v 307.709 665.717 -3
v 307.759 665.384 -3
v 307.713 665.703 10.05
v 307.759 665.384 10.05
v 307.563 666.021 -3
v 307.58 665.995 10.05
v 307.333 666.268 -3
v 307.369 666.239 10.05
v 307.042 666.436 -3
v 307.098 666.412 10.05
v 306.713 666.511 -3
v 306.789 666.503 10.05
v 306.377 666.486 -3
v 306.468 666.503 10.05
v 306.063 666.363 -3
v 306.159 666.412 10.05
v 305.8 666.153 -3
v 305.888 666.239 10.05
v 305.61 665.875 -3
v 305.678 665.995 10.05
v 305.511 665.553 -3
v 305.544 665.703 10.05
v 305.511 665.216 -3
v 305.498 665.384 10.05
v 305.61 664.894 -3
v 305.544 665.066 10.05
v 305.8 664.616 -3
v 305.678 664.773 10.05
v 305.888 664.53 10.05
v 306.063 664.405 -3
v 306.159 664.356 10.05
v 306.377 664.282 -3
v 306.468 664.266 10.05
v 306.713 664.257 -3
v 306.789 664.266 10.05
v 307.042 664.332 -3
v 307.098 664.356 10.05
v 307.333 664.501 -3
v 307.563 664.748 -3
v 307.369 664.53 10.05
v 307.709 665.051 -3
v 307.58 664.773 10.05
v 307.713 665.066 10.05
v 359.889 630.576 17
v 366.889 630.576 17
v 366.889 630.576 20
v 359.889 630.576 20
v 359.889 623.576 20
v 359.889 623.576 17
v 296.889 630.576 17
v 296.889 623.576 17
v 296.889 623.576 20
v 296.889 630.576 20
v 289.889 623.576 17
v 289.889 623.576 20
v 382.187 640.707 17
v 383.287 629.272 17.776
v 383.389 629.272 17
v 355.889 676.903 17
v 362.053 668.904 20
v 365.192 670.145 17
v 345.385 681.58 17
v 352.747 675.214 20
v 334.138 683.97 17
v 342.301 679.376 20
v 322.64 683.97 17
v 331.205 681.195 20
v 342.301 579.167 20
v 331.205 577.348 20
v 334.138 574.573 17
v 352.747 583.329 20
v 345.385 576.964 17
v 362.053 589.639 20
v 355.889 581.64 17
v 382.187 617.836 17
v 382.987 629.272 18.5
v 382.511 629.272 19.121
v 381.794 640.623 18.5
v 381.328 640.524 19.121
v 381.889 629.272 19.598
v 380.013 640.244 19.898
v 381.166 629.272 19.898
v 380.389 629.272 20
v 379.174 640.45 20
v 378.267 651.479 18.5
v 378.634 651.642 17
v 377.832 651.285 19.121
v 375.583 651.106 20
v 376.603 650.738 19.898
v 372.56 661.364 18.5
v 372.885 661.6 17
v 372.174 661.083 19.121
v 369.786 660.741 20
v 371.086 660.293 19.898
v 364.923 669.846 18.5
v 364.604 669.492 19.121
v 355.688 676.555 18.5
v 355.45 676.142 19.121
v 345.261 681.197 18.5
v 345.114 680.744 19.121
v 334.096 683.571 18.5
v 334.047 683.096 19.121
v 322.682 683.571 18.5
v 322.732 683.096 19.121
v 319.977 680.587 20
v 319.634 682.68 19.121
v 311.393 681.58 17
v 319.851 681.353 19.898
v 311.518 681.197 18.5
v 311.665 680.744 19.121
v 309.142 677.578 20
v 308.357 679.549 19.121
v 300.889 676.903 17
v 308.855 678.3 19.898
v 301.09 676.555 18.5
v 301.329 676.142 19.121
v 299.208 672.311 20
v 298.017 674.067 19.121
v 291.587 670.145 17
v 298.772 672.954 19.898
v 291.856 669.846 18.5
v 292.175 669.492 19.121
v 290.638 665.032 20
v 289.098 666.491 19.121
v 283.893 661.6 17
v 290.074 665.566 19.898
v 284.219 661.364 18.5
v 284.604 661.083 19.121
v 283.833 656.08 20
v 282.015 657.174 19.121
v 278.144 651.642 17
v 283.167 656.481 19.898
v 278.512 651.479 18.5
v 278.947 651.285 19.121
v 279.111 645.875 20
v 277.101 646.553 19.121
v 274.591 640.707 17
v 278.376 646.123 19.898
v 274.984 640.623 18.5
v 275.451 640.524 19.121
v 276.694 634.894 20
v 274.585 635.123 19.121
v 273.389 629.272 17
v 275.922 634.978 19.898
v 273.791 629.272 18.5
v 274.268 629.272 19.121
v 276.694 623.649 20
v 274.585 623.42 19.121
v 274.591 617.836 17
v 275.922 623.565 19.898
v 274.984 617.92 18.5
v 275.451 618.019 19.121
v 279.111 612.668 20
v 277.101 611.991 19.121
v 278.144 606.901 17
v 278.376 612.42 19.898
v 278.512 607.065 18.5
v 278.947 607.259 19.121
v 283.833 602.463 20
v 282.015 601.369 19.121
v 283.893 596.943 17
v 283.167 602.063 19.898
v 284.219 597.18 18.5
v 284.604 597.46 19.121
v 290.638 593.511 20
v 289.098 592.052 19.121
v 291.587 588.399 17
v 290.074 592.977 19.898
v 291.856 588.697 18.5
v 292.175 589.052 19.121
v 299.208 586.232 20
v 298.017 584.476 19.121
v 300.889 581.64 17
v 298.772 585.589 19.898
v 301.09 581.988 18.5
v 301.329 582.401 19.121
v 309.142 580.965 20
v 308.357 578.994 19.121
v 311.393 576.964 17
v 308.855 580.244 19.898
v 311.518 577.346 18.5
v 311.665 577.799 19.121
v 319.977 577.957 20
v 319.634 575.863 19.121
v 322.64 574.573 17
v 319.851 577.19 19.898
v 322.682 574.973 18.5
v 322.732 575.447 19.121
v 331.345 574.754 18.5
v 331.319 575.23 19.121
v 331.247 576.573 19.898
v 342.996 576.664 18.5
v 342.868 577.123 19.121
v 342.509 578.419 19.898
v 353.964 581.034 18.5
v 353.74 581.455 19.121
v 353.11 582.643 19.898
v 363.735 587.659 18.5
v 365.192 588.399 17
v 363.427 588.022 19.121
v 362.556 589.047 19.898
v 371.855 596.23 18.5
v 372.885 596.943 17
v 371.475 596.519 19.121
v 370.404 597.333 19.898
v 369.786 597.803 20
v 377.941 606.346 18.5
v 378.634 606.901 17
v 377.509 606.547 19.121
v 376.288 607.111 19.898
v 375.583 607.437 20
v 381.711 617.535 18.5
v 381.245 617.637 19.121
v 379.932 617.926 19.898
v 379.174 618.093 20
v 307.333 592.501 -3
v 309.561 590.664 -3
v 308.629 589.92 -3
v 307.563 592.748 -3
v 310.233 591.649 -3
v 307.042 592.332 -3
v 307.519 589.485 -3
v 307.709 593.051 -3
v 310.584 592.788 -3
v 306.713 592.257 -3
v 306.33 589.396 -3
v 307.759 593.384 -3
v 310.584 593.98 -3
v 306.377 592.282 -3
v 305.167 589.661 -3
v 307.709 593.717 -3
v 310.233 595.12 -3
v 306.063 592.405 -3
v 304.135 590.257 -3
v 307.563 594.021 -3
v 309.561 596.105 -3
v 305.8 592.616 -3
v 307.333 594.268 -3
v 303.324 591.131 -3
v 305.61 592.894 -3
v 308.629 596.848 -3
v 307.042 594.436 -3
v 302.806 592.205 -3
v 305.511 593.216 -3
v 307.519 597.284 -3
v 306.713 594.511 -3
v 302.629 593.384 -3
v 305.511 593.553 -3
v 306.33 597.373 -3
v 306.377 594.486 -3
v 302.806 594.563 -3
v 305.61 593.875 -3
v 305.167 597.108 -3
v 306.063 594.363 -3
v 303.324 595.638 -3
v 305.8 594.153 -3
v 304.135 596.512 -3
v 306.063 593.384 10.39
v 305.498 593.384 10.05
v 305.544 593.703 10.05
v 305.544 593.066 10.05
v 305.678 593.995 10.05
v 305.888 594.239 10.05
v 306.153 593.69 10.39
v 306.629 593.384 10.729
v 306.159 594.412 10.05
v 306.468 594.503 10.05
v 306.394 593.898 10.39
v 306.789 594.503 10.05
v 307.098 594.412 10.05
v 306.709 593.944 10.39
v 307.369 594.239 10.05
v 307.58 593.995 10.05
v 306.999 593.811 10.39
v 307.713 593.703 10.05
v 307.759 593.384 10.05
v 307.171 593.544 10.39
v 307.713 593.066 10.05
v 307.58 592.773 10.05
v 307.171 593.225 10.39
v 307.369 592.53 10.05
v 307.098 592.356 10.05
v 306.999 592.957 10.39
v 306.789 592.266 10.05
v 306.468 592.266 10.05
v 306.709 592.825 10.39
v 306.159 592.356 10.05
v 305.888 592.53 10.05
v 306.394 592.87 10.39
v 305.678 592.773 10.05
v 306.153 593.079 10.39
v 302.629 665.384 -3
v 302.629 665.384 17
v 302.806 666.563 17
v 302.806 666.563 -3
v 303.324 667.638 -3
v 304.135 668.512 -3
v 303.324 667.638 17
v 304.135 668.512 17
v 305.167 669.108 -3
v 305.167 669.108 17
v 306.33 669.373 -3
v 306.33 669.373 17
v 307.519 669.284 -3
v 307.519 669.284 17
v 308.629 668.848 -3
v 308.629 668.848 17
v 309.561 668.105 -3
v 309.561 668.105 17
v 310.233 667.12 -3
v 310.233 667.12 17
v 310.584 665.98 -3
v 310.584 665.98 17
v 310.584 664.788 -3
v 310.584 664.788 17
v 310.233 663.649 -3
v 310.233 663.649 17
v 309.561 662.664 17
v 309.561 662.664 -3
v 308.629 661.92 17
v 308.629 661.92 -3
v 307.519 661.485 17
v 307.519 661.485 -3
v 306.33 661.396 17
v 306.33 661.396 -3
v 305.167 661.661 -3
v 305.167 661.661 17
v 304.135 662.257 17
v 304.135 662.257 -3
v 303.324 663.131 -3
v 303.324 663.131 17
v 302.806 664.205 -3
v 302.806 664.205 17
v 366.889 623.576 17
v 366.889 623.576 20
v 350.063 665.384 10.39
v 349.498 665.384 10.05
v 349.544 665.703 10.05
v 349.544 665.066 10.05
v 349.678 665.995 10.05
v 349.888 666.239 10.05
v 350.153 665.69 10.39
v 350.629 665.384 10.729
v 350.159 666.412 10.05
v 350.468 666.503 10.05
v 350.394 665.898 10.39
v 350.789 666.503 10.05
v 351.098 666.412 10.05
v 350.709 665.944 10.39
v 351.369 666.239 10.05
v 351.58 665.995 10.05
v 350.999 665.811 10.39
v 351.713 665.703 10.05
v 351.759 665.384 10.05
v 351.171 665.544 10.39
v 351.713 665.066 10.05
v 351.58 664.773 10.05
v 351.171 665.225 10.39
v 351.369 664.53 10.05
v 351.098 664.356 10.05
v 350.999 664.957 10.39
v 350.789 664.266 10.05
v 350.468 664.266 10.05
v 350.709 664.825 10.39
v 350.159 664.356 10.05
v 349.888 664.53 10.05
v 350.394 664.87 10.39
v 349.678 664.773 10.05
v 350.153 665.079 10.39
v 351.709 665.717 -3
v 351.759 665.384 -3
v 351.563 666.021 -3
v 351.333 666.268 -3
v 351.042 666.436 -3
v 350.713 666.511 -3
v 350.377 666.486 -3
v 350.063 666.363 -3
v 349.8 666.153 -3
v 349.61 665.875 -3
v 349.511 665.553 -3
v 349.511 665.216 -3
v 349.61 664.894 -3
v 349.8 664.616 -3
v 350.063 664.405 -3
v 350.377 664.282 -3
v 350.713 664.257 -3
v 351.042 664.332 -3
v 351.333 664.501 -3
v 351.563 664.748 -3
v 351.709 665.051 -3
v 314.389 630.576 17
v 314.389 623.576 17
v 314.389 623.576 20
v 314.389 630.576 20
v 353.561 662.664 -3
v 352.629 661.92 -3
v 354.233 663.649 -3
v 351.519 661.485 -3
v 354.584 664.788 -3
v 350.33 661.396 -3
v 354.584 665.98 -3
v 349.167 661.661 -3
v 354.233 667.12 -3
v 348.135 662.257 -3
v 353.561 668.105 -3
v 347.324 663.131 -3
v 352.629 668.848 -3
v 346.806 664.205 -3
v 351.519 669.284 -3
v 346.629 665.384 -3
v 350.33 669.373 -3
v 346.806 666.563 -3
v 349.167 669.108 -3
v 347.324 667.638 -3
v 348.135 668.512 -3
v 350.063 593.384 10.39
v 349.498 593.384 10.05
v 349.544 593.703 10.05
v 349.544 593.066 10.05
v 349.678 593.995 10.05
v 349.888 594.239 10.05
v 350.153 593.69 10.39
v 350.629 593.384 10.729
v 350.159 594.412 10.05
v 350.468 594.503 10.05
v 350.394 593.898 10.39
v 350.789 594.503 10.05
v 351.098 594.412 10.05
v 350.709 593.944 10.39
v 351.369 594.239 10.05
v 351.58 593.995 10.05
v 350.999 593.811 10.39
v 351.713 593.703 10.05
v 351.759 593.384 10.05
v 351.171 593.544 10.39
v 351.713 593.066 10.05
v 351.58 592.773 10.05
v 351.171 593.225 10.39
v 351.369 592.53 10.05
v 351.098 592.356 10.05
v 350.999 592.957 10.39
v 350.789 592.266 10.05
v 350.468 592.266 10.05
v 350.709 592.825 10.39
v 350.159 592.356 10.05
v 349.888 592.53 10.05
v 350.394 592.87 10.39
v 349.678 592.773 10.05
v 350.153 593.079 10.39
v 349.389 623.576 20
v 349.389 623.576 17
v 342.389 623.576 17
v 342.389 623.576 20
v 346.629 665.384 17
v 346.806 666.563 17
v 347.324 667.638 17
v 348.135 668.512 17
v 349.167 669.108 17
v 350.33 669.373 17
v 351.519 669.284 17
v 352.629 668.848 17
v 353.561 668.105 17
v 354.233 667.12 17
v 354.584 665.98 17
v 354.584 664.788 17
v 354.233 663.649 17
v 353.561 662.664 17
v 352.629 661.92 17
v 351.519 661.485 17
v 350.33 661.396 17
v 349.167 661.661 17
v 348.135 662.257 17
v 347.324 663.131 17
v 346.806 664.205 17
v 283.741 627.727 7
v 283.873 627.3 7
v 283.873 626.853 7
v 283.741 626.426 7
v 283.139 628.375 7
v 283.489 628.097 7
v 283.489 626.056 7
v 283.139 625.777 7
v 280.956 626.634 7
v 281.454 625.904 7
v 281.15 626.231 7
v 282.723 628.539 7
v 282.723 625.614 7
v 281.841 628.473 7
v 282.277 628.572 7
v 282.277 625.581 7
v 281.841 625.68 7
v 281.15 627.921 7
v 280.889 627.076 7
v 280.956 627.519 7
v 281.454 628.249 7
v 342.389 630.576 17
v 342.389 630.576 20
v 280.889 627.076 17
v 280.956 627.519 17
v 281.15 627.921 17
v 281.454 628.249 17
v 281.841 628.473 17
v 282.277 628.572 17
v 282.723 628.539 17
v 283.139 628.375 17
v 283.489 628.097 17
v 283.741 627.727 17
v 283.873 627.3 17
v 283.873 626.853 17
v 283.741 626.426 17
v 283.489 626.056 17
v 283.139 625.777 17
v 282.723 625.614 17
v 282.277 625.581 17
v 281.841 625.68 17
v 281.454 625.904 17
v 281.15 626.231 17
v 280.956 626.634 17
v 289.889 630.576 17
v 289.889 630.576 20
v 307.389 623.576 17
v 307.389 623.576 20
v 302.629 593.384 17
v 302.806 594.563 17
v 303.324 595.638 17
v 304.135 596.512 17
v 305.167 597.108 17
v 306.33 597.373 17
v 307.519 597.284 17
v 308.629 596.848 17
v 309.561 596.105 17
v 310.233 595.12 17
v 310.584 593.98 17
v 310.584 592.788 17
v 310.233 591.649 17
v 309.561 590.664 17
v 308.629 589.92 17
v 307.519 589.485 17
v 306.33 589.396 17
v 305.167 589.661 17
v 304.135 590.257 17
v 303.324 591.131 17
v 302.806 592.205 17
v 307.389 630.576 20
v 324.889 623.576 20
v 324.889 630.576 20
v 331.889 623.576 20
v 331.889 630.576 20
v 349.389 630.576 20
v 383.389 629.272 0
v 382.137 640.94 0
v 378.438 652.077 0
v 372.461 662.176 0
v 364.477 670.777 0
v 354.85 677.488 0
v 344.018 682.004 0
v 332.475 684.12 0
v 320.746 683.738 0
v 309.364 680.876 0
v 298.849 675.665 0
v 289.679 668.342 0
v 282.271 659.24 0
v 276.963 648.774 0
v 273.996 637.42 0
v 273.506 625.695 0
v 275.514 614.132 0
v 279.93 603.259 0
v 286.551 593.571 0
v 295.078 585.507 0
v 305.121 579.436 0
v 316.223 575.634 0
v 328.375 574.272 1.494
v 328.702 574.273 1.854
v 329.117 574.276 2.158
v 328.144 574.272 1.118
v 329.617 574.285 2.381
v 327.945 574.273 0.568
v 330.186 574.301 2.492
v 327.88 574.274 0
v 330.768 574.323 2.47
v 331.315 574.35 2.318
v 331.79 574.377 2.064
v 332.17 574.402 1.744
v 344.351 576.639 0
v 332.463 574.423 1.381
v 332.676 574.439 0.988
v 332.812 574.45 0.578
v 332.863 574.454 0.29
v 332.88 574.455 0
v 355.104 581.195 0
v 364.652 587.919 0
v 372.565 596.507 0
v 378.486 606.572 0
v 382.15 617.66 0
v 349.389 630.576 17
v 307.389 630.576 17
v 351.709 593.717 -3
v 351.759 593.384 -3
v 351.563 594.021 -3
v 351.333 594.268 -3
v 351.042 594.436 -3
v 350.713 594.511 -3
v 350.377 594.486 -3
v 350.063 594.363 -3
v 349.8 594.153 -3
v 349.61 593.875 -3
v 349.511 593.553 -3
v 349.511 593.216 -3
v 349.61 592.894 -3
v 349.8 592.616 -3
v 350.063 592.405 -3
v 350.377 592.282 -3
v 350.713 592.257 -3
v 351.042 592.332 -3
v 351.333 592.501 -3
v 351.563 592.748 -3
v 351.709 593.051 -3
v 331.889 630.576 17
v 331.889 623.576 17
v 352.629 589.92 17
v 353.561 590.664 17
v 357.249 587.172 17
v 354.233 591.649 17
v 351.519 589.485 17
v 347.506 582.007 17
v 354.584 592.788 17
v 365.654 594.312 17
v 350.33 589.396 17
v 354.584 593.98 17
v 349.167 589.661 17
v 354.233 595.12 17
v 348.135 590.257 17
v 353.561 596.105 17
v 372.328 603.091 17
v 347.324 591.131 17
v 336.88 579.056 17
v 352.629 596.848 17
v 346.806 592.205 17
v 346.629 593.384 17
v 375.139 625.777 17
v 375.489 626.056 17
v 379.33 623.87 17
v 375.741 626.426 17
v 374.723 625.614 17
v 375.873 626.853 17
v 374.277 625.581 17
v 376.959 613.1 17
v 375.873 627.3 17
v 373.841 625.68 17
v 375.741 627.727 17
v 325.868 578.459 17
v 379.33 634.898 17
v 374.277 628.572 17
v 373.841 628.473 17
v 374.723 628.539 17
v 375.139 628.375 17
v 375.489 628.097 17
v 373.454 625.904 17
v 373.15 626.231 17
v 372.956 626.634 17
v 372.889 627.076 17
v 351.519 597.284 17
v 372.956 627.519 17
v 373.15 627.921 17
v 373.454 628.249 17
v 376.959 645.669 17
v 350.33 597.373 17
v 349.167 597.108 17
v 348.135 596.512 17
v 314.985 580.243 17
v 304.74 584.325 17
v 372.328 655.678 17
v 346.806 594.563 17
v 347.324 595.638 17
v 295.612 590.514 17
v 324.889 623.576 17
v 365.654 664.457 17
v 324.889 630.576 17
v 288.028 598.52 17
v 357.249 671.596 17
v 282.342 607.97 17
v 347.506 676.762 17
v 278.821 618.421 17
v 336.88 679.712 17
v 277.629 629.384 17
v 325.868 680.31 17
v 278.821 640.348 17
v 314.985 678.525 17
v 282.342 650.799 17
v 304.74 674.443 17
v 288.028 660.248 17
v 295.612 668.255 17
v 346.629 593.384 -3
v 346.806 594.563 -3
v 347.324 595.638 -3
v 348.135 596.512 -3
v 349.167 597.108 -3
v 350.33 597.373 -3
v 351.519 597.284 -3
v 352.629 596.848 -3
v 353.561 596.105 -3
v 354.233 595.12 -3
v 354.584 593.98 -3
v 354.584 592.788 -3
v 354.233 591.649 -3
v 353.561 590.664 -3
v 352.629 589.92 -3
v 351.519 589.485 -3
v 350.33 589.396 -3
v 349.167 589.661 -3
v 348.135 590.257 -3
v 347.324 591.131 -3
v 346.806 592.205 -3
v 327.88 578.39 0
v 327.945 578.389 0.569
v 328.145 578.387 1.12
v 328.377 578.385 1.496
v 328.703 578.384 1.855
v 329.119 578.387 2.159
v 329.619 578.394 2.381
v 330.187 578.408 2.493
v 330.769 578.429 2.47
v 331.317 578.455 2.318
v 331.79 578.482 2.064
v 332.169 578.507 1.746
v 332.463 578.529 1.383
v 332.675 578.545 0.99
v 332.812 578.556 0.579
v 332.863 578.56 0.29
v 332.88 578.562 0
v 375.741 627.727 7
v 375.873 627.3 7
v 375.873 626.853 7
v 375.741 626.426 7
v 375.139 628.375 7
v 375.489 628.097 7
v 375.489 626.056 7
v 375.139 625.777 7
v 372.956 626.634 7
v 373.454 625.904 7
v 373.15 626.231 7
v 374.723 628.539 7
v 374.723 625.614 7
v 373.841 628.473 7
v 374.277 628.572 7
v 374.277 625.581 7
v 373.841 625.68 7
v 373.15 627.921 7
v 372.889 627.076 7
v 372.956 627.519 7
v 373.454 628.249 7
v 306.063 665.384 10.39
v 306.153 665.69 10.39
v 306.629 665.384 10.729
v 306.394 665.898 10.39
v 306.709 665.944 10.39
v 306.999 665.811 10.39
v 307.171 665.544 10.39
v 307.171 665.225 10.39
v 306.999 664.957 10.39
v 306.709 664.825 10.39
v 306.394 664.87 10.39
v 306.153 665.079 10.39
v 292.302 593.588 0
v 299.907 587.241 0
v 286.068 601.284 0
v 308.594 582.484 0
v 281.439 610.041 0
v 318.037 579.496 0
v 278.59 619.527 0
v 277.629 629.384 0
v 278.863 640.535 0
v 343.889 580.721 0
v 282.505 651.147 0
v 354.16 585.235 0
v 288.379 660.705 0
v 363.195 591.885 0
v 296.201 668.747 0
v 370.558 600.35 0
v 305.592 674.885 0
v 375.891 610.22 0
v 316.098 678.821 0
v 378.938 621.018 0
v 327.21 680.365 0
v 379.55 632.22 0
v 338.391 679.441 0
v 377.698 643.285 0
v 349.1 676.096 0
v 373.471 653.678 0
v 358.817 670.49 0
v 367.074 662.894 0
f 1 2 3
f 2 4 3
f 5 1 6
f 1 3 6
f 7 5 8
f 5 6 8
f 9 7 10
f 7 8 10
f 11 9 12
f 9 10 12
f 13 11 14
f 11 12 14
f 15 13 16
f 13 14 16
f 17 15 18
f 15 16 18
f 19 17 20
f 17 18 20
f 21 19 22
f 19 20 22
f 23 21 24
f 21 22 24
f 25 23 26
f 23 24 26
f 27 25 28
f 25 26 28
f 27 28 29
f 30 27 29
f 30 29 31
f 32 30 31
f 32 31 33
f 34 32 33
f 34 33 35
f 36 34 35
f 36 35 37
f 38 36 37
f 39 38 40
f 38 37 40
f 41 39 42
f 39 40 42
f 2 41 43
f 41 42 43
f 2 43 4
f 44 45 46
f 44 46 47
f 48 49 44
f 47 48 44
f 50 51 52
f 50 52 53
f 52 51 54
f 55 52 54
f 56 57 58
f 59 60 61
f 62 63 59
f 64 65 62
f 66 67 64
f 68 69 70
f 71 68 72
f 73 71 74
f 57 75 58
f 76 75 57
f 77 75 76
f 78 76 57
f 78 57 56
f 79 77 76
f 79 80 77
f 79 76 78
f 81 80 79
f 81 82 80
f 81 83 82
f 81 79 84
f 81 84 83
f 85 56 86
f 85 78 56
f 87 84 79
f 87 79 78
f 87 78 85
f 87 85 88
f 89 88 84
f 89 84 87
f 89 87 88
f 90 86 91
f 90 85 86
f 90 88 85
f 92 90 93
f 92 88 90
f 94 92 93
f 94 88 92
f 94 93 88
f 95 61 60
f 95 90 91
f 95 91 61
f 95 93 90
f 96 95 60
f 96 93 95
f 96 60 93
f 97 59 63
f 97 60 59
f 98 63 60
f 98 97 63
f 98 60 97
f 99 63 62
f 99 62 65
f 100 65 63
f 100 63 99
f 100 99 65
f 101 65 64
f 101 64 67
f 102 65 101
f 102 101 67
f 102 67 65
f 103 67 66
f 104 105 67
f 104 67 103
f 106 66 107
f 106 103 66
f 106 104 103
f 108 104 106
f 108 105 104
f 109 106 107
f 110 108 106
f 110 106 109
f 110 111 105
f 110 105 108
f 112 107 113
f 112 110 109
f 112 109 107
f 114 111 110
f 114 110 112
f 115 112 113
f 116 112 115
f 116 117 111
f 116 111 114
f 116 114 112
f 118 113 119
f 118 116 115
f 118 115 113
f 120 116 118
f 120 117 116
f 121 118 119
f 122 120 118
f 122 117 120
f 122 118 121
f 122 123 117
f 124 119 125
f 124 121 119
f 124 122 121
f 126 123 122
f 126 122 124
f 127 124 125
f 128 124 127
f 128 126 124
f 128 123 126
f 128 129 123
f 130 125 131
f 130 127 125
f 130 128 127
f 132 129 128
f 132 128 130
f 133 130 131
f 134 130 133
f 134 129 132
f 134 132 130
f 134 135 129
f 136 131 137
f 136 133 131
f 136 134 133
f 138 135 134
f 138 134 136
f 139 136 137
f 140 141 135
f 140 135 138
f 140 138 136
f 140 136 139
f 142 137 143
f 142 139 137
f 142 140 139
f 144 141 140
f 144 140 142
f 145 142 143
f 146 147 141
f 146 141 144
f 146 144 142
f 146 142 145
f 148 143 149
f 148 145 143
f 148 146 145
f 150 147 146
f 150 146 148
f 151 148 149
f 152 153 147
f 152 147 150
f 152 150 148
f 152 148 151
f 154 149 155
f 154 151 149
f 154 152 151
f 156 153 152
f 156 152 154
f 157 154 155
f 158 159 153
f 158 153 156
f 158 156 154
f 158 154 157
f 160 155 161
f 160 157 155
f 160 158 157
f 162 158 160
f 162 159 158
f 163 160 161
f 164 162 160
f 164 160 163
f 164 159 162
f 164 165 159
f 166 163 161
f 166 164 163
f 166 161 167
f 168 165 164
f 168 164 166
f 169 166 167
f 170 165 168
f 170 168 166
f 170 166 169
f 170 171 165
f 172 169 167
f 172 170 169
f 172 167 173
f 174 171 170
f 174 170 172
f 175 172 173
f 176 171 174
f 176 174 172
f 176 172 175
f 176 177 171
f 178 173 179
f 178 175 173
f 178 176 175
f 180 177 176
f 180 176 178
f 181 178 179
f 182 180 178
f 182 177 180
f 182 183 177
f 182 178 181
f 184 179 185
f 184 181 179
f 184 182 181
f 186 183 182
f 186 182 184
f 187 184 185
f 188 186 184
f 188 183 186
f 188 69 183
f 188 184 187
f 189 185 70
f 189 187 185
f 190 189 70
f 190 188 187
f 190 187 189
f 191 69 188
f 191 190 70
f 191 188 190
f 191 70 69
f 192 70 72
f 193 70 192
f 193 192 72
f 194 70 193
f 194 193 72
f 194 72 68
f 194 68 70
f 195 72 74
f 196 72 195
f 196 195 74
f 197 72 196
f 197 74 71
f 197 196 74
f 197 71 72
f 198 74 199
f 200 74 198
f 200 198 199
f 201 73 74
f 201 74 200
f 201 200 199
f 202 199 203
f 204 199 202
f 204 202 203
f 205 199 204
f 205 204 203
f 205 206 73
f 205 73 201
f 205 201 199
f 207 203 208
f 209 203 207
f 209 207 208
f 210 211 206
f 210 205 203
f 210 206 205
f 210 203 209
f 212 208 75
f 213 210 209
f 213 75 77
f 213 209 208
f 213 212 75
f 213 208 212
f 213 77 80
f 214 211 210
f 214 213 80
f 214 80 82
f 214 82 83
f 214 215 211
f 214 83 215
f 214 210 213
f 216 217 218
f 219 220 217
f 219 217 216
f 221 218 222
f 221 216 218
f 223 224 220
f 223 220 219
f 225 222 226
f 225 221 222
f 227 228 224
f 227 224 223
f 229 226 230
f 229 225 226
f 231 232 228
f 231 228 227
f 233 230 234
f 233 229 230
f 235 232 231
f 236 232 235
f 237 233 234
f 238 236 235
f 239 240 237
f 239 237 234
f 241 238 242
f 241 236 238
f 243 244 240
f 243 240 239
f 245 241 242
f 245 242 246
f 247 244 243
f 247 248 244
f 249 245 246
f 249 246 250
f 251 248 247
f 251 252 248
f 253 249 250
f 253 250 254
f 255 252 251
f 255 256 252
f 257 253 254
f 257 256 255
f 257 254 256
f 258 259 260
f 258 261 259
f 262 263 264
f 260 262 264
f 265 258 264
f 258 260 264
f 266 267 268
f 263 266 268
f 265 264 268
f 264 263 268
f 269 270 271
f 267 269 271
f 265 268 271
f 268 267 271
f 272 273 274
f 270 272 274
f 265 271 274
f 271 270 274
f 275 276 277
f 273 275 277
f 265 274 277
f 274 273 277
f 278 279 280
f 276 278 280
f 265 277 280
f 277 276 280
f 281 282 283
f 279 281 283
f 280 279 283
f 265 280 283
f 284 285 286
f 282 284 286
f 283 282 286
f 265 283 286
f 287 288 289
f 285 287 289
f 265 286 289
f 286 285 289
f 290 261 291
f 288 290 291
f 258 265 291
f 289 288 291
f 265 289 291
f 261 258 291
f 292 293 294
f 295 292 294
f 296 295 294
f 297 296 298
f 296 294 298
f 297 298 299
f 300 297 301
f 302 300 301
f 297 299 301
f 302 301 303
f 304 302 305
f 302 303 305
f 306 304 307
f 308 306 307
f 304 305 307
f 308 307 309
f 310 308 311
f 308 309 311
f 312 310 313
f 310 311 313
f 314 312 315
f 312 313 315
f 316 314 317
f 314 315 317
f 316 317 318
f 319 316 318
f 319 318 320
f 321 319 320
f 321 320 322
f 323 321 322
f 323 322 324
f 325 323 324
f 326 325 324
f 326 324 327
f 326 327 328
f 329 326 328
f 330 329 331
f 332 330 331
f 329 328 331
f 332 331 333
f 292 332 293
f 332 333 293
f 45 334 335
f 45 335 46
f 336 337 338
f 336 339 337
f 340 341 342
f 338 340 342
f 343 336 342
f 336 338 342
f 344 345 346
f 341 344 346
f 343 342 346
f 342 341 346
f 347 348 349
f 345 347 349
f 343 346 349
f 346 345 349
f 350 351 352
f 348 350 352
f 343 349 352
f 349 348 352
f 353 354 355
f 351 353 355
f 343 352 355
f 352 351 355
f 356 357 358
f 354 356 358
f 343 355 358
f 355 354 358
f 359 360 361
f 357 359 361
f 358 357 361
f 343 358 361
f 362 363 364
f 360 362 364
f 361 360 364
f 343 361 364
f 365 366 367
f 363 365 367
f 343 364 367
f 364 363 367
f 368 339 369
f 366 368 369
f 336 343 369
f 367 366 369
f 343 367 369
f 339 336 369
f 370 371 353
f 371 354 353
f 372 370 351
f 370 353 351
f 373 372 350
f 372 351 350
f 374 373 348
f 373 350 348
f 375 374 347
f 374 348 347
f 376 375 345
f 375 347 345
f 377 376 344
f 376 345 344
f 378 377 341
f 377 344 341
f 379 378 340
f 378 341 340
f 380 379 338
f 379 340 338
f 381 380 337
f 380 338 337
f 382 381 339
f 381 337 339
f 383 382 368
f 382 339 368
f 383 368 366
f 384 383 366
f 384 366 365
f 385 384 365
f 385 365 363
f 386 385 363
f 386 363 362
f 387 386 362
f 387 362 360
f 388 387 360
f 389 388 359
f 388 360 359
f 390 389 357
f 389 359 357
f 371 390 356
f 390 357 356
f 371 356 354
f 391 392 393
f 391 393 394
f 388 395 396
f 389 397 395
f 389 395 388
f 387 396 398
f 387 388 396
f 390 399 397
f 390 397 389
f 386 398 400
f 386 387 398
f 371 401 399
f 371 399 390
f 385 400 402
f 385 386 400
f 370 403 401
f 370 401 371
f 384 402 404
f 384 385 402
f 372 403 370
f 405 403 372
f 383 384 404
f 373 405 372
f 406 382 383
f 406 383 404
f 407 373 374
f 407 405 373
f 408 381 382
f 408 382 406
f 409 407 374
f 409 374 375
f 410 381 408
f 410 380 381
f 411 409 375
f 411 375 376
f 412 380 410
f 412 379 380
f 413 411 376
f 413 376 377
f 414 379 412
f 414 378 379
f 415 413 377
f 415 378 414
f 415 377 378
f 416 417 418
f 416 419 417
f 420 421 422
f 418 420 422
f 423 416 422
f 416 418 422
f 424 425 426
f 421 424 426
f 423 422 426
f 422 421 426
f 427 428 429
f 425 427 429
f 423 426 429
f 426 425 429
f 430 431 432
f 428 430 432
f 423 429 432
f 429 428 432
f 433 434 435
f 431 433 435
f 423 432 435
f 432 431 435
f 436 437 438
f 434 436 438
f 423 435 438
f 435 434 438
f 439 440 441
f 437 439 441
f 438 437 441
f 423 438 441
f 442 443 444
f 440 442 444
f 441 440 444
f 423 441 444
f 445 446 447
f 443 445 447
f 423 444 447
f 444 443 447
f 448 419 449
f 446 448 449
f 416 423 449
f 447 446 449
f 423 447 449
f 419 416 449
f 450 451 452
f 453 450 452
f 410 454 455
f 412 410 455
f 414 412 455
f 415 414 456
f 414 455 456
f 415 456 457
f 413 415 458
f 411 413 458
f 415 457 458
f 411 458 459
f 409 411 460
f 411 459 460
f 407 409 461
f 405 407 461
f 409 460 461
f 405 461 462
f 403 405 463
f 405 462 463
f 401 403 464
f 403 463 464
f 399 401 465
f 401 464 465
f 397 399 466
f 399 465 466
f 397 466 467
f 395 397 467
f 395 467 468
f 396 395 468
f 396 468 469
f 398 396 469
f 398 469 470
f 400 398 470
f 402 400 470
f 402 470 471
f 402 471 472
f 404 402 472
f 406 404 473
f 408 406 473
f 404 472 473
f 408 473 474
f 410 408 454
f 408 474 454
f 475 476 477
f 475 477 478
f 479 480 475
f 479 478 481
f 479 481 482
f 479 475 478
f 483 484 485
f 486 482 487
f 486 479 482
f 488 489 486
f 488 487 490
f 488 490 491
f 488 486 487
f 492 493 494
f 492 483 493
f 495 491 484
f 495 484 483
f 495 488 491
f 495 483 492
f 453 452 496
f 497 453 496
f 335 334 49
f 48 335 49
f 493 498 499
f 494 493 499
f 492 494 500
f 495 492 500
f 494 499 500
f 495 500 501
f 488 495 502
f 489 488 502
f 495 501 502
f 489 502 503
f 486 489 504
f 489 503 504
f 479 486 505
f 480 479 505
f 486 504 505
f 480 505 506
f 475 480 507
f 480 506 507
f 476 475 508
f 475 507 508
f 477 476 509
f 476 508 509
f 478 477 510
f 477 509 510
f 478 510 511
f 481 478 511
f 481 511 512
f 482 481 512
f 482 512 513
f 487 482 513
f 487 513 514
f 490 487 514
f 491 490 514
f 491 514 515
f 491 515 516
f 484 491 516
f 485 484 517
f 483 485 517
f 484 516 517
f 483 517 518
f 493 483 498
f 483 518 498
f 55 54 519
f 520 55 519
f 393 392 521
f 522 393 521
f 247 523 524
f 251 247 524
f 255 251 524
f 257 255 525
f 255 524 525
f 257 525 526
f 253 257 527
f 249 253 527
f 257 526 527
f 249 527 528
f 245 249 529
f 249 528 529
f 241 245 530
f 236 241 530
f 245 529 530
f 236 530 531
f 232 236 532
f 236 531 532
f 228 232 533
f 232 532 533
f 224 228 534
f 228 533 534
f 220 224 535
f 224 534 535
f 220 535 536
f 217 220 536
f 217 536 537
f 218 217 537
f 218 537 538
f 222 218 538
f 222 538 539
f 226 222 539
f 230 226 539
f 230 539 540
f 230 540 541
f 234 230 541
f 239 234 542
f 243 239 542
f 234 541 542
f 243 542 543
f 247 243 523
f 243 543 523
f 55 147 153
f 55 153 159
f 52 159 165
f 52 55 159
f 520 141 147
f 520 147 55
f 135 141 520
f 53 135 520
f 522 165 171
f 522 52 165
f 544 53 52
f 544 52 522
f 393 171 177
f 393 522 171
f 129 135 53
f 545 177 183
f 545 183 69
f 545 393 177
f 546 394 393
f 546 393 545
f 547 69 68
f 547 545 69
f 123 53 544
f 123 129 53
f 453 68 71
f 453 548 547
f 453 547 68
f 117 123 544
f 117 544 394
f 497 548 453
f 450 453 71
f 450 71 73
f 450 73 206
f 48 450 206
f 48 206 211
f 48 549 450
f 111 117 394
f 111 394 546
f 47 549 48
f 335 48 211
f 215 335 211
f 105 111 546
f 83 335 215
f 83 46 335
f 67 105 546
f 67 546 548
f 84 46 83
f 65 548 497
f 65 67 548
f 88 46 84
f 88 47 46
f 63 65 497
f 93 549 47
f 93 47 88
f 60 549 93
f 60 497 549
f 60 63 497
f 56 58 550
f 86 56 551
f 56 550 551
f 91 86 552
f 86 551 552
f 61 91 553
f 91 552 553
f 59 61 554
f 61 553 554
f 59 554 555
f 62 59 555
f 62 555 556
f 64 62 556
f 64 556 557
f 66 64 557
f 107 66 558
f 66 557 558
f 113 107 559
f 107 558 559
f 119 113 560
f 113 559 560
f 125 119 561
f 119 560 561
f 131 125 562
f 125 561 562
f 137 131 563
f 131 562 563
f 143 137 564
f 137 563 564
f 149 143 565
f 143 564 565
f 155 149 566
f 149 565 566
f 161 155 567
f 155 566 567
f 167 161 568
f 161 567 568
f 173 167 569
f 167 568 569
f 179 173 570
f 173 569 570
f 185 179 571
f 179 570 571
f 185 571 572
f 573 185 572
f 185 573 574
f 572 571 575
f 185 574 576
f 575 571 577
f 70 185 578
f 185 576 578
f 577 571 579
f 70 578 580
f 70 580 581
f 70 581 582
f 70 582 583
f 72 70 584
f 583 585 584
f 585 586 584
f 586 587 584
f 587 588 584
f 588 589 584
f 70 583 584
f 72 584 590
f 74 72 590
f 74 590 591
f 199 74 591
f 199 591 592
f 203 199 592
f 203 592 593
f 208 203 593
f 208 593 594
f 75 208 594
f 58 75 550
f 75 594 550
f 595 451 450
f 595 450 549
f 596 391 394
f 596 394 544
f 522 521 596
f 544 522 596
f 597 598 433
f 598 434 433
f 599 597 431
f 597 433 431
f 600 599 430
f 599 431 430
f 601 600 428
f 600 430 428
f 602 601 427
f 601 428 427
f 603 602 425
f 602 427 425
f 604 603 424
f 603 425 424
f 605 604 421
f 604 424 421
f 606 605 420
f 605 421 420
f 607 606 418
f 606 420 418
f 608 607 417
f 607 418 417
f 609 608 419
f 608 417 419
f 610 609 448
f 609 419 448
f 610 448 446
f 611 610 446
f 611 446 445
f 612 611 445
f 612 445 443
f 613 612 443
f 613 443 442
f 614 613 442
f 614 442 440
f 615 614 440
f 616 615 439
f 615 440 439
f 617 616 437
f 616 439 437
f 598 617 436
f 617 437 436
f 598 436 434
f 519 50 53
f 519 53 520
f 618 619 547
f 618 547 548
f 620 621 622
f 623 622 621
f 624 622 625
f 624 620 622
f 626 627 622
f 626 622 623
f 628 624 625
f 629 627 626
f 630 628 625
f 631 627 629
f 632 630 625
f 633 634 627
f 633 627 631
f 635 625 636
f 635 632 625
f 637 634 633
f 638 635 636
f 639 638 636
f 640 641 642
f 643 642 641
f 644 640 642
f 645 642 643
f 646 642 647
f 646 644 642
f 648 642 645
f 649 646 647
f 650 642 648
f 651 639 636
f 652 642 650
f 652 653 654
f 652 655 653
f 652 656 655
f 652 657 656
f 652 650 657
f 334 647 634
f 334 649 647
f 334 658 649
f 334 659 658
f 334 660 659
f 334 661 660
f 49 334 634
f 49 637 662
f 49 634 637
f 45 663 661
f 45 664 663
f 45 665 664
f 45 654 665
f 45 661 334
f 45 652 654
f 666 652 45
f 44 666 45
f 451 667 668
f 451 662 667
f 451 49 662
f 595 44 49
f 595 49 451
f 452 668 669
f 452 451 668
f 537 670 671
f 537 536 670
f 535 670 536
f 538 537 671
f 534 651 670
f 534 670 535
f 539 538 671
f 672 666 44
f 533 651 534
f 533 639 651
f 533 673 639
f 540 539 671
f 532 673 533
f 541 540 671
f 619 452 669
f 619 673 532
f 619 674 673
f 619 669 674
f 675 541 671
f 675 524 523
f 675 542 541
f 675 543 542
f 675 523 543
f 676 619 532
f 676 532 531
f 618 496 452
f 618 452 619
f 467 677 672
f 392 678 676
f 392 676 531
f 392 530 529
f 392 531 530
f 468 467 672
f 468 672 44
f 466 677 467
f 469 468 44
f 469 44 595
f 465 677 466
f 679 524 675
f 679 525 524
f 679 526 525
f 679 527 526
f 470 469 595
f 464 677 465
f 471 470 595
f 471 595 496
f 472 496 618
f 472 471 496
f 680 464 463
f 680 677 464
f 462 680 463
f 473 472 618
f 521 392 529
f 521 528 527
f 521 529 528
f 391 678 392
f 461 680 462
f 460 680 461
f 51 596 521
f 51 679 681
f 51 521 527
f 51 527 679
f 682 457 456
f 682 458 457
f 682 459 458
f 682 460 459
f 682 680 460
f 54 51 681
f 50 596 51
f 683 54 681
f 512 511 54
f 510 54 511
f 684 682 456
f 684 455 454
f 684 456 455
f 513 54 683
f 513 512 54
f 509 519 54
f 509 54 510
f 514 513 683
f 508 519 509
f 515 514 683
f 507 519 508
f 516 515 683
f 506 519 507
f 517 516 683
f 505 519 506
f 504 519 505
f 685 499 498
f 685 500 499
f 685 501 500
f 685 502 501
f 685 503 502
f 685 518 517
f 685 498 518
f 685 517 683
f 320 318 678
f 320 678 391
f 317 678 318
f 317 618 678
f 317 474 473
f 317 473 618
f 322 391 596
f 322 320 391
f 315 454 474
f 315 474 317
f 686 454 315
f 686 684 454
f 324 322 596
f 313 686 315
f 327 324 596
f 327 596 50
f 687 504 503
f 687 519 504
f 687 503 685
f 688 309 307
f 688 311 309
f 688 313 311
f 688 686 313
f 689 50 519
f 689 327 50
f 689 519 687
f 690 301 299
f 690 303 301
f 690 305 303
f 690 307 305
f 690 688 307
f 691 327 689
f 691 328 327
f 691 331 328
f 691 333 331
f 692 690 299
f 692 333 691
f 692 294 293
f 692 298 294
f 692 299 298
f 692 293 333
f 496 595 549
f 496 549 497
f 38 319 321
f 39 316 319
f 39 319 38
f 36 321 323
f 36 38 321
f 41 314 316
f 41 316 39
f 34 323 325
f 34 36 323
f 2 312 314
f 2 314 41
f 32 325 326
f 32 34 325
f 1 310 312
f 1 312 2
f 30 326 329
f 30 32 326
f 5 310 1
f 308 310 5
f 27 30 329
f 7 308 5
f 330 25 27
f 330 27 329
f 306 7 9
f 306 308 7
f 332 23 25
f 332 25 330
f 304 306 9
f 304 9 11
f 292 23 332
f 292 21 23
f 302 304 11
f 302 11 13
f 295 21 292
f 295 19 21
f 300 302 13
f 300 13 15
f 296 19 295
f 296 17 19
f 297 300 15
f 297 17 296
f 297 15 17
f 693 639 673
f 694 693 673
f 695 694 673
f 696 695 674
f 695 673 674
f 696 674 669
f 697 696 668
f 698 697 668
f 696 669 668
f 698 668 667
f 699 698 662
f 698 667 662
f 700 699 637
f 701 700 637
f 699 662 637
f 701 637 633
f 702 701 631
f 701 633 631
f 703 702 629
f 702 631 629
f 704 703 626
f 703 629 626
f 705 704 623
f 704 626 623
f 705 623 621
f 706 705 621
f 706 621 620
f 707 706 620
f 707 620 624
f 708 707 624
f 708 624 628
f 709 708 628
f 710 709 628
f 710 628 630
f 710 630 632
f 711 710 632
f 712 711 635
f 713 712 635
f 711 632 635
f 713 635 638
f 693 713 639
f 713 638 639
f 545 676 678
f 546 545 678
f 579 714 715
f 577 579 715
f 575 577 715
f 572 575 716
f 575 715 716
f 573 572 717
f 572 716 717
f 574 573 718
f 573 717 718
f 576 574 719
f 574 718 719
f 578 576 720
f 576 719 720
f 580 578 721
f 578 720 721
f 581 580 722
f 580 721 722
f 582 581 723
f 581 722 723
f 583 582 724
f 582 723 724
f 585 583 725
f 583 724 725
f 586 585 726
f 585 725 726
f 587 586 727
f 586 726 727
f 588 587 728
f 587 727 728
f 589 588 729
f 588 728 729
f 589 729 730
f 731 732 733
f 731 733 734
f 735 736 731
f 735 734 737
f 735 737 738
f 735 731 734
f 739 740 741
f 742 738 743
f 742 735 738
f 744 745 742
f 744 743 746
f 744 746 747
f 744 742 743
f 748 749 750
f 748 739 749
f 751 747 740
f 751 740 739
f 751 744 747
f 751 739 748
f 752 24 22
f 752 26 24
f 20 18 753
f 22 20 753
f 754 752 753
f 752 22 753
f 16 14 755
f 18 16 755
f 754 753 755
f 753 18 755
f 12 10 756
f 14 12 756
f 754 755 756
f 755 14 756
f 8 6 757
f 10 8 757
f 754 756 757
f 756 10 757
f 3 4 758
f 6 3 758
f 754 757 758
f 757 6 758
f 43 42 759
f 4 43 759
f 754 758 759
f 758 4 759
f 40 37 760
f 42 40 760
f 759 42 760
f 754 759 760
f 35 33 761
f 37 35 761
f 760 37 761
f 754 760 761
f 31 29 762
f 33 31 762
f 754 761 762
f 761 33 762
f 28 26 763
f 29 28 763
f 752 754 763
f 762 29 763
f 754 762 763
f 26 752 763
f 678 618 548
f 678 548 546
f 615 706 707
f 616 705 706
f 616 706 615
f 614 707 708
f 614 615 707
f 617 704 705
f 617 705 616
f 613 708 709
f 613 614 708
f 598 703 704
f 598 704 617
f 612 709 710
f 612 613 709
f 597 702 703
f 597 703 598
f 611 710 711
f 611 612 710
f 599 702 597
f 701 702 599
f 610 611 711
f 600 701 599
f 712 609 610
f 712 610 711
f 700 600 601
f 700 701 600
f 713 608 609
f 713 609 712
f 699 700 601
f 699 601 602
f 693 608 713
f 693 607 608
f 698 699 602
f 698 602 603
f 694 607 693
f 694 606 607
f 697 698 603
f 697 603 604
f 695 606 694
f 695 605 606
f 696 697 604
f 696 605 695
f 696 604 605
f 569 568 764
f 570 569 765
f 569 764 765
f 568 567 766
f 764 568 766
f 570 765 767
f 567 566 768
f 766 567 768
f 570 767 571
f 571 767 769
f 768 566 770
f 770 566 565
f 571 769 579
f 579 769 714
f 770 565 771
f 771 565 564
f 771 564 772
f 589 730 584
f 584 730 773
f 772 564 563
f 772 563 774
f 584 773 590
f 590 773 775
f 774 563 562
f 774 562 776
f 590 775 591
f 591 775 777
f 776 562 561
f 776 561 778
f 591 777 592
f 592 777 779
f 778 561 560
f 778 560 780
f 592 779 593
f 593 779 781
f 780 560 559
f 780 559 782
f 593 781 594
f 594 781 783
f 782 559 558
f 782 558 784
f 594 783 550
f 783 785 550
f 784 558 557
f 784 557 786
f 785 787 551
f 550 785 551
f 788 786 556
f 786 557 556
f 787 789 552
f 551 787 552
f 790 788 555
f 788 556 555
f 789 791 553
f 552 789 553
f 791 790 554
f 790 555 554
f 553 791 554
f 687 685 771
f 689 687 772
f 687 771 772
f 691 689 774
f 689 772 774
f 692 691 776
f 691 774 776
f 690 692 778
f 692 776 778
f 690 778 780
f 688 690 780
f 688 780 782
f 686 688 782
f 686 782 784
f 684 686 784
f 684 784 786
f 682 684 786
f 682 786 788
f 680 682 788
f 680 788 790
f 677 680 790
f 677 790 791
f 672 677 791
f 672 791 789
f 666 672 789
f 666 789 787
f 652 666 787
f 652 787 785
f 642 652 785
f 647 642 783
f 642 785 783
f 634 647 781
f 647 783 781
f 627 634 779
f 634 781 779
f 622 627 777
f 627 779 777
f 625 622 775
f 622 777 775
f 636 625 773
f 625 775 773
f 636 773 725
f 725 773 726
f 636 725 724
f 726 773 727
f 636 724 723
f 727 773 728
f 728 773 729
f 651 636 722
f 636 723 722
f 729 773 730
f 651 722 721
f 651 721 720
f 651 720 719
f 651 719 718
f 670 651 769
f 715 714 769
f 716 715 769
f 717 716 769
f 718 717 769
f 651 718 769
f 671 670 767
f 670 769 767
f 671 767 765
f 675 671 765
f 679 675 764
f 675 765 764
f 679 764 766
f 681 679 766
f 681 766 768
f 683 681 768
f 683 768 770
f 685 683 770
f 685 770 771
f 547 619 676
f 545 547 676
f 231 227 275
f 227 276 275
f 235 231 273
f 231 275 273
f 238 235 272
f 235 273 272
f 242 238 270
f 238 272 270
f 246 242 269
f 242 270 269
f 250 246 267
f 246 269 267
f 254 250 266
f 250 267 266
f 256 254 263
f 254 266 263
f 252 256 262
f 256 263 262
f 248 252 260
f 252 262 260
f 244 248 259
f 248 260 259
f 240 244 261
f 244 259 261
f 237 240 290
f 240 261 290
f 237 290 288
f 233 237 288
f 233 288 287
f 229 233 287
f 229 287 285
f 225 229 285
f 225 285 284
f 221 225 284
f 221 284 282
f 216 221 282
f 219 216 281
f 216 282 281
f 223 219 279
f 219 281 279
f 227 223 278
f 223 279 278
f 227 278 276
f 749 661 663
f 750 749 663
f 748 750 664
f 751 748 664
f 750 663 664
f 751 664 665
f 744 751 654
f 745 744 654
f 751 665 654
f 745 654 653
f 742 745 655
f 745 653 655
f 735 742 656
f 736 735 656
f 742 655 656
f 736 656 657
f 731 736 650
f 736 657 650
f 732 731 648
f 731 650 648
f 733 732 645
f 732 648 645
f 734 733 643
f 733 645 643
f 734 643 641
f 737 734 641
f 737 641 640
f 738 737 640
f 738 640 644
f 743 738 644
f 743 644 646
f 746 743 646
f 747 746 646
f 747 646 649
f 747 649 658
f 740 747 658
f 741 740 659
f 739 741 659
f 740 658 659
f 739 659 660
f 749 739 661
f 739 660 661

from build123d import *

# Parameters (mm, degrees)
SKETCH1_R                     = 55
BOSS_EXTRUDE2_DEPTH           = 20
SKETCH2_R                     = 51
CUT_EXTRUDE1_DEPTH            = 17
SKETCH10_R                    = 1.5
BOSS_EXTRUDE3_DEPTH           = 10
SKETCH10_3_W                  = 7
SKETCH10_3_H                  = 7
CUT_EXTRUDE4_DEPTH            = 10
FILLET1_R                     = 3
SKETCH11_R                    = 4
BOSS_EXTRUDE4_DEPTH           = 20
TAP_DRILL_FOR_4_40_TAP1_D     = 2.2606
TAP_DRILL_FOR_4_40_TAP1_DEPTH = 13.05
TAP_DRILL_FOR_4_40_TAP1_TIP   = 0.679152758
SKETCH14_R                    = 2.5
CUT_EXTRUDE5_DEPTH            = 50


with BuildPart() as part:
    # Sketch1 → Boss-Extrude2 (new body)
    with BuildSketch(Plane.XY):
        with Locations((328.389379834, 629.271631436)):
            Circle(SKETCH1_R)
    extrude(amount=BOSS_EXTRUDE2_DEPTH)

    # Sketch2 → Cut-Extrude1 (cut)
    with BuildSketch(Plane(origin=(0, 0, 0), x_dir=(-1, 0, 0), z_dir=(0, 0, -1))):
        with Locations((-328.628637891, 629.384320649)):
            Circle(SKETCH2_R)
    extrude(amount=-CUT_EXTRUDE1_DEPTH, mode=Mode.SUBTRACT)

    # Sketch10 → Boss-Extrude3 (add)
    with BuildSketch(Plane(origin=(0, 0, 17), x_dir=(-1, 0, 0), z_dir=(0, 0, -1))):
        with Locations((-374.389379834, 627.076422512)):
            Circle(SKETCH10_R)
        with Locations((-282.389379834, 627.076422512)):
            Circle(SKETCH10_R)
    extrude(amount=BOSS_EXTRUDE3_DEPTH)

    # Sketch10<3> → Cut-Extrude4 (cut)
    with BuildSketch(Plane(origin=(0, 0, 17), x_dir=(-1, 0, 0), z_dir=(0, 0, -1))):
        with Locations((-328.389379834, 627.076422512)):
            Rectangle(SKETCH10_3_W, SKETCH10_3_H)
        with Locations((-310.889379834, 627.076422512)):
            Rectangle(SKETCH10_3_W, SKETCH10_3_H)
        with Locations((-293.389379834, 627.076422512)):
            Rectangle(SKETCH10_3_W, SKETCH10_3_H)
        with Locations((-345.889379834, 627.076422512)):
            Rectangle(SKETCH10_3_W, SKETCH10_3_H)
        with Locations((-363.389379834, 627.076422512)):
            Rectangle(SKETCH10_3_W, SKETCH10_3_H)
    extrude(amount=-CUT_EXTRUDE4_DEPTH, mode=Mode.SUBTRACT)

    # Fillet1
    fillet1_edges = [part.edges().sort_by_distance(p)[0] for p in [
        (273.389379834, 629.271631436, 20),
    ]]
    fillet(fillet1_edges, radius=FILLET1_R)

    # Sketch11 → Boss-Extrude4 (add)
    with BuildSketch(Plane(origin=(0, 0, 17), x_dir=(-1, 0, 0), z_dir=(0, 0, -1))):
        with Locations((-306.628637891, 665.384320649)):
            Circle(SKETCH11_R)
        with Locations((-350.628637891, 665.384320649)):
            Circle(SKETCH11_R)
        with Locations((-350.628637891, 593.384320649)):
            Circle(SKETCH11_R)
        with Locations((-306.628637891, 593.384320649)):
            Circle(SKETCH11_R)
    extrude(amount=BOSS_EXTRUDE4_DEPTH)

    # Tap Drill for #4-40 Tap1
    with Locations(Plane(origin=(0, 0, -3), x_dir=(-1, 0, 0), z_dir=(0, 0, -1))):
        with Locations((-350.628637891, 665.384320649), (-306.628637891, 665.384320649), (-350.628637891, 593.384320649), (-306.628637891, 593.384320649)):
            Hole(TAP_DRILL_FOR_4_40_TAP1_D / 2, depth=TAP_DRILL_FOR_4_40_TAP1_DEPTH)
            with Locations((0, 0, -(TAP_DRILL_FOR_4_40_TAP1_DEPTH + TAP_DRILL_FOR_4_40_TAP1_TIP / 2))):  # 118° drill point
                Cone(0, TAP_DRILL_FOR_4_40_TAP1_D / 2, TAP_DRILL_FOR_4_40_TAP1_TIP, mode=Mode.SUBTRACT)

    # Sketch14 → Cut-Extrude5 (cut)
    with BuildSketch(Plane(origin=(0, 623.576422512, 0), x_dir=(1, 0, 0), z_dir=(0, 1, 0))):
        with Locations((330.379647502, 0)):
            Circle(SKETCH14_R)
    extrude(amount=-CUT_EXTRUDE5_DEPTH, mode=Mode.SUBTRACT)


solid = part.part
